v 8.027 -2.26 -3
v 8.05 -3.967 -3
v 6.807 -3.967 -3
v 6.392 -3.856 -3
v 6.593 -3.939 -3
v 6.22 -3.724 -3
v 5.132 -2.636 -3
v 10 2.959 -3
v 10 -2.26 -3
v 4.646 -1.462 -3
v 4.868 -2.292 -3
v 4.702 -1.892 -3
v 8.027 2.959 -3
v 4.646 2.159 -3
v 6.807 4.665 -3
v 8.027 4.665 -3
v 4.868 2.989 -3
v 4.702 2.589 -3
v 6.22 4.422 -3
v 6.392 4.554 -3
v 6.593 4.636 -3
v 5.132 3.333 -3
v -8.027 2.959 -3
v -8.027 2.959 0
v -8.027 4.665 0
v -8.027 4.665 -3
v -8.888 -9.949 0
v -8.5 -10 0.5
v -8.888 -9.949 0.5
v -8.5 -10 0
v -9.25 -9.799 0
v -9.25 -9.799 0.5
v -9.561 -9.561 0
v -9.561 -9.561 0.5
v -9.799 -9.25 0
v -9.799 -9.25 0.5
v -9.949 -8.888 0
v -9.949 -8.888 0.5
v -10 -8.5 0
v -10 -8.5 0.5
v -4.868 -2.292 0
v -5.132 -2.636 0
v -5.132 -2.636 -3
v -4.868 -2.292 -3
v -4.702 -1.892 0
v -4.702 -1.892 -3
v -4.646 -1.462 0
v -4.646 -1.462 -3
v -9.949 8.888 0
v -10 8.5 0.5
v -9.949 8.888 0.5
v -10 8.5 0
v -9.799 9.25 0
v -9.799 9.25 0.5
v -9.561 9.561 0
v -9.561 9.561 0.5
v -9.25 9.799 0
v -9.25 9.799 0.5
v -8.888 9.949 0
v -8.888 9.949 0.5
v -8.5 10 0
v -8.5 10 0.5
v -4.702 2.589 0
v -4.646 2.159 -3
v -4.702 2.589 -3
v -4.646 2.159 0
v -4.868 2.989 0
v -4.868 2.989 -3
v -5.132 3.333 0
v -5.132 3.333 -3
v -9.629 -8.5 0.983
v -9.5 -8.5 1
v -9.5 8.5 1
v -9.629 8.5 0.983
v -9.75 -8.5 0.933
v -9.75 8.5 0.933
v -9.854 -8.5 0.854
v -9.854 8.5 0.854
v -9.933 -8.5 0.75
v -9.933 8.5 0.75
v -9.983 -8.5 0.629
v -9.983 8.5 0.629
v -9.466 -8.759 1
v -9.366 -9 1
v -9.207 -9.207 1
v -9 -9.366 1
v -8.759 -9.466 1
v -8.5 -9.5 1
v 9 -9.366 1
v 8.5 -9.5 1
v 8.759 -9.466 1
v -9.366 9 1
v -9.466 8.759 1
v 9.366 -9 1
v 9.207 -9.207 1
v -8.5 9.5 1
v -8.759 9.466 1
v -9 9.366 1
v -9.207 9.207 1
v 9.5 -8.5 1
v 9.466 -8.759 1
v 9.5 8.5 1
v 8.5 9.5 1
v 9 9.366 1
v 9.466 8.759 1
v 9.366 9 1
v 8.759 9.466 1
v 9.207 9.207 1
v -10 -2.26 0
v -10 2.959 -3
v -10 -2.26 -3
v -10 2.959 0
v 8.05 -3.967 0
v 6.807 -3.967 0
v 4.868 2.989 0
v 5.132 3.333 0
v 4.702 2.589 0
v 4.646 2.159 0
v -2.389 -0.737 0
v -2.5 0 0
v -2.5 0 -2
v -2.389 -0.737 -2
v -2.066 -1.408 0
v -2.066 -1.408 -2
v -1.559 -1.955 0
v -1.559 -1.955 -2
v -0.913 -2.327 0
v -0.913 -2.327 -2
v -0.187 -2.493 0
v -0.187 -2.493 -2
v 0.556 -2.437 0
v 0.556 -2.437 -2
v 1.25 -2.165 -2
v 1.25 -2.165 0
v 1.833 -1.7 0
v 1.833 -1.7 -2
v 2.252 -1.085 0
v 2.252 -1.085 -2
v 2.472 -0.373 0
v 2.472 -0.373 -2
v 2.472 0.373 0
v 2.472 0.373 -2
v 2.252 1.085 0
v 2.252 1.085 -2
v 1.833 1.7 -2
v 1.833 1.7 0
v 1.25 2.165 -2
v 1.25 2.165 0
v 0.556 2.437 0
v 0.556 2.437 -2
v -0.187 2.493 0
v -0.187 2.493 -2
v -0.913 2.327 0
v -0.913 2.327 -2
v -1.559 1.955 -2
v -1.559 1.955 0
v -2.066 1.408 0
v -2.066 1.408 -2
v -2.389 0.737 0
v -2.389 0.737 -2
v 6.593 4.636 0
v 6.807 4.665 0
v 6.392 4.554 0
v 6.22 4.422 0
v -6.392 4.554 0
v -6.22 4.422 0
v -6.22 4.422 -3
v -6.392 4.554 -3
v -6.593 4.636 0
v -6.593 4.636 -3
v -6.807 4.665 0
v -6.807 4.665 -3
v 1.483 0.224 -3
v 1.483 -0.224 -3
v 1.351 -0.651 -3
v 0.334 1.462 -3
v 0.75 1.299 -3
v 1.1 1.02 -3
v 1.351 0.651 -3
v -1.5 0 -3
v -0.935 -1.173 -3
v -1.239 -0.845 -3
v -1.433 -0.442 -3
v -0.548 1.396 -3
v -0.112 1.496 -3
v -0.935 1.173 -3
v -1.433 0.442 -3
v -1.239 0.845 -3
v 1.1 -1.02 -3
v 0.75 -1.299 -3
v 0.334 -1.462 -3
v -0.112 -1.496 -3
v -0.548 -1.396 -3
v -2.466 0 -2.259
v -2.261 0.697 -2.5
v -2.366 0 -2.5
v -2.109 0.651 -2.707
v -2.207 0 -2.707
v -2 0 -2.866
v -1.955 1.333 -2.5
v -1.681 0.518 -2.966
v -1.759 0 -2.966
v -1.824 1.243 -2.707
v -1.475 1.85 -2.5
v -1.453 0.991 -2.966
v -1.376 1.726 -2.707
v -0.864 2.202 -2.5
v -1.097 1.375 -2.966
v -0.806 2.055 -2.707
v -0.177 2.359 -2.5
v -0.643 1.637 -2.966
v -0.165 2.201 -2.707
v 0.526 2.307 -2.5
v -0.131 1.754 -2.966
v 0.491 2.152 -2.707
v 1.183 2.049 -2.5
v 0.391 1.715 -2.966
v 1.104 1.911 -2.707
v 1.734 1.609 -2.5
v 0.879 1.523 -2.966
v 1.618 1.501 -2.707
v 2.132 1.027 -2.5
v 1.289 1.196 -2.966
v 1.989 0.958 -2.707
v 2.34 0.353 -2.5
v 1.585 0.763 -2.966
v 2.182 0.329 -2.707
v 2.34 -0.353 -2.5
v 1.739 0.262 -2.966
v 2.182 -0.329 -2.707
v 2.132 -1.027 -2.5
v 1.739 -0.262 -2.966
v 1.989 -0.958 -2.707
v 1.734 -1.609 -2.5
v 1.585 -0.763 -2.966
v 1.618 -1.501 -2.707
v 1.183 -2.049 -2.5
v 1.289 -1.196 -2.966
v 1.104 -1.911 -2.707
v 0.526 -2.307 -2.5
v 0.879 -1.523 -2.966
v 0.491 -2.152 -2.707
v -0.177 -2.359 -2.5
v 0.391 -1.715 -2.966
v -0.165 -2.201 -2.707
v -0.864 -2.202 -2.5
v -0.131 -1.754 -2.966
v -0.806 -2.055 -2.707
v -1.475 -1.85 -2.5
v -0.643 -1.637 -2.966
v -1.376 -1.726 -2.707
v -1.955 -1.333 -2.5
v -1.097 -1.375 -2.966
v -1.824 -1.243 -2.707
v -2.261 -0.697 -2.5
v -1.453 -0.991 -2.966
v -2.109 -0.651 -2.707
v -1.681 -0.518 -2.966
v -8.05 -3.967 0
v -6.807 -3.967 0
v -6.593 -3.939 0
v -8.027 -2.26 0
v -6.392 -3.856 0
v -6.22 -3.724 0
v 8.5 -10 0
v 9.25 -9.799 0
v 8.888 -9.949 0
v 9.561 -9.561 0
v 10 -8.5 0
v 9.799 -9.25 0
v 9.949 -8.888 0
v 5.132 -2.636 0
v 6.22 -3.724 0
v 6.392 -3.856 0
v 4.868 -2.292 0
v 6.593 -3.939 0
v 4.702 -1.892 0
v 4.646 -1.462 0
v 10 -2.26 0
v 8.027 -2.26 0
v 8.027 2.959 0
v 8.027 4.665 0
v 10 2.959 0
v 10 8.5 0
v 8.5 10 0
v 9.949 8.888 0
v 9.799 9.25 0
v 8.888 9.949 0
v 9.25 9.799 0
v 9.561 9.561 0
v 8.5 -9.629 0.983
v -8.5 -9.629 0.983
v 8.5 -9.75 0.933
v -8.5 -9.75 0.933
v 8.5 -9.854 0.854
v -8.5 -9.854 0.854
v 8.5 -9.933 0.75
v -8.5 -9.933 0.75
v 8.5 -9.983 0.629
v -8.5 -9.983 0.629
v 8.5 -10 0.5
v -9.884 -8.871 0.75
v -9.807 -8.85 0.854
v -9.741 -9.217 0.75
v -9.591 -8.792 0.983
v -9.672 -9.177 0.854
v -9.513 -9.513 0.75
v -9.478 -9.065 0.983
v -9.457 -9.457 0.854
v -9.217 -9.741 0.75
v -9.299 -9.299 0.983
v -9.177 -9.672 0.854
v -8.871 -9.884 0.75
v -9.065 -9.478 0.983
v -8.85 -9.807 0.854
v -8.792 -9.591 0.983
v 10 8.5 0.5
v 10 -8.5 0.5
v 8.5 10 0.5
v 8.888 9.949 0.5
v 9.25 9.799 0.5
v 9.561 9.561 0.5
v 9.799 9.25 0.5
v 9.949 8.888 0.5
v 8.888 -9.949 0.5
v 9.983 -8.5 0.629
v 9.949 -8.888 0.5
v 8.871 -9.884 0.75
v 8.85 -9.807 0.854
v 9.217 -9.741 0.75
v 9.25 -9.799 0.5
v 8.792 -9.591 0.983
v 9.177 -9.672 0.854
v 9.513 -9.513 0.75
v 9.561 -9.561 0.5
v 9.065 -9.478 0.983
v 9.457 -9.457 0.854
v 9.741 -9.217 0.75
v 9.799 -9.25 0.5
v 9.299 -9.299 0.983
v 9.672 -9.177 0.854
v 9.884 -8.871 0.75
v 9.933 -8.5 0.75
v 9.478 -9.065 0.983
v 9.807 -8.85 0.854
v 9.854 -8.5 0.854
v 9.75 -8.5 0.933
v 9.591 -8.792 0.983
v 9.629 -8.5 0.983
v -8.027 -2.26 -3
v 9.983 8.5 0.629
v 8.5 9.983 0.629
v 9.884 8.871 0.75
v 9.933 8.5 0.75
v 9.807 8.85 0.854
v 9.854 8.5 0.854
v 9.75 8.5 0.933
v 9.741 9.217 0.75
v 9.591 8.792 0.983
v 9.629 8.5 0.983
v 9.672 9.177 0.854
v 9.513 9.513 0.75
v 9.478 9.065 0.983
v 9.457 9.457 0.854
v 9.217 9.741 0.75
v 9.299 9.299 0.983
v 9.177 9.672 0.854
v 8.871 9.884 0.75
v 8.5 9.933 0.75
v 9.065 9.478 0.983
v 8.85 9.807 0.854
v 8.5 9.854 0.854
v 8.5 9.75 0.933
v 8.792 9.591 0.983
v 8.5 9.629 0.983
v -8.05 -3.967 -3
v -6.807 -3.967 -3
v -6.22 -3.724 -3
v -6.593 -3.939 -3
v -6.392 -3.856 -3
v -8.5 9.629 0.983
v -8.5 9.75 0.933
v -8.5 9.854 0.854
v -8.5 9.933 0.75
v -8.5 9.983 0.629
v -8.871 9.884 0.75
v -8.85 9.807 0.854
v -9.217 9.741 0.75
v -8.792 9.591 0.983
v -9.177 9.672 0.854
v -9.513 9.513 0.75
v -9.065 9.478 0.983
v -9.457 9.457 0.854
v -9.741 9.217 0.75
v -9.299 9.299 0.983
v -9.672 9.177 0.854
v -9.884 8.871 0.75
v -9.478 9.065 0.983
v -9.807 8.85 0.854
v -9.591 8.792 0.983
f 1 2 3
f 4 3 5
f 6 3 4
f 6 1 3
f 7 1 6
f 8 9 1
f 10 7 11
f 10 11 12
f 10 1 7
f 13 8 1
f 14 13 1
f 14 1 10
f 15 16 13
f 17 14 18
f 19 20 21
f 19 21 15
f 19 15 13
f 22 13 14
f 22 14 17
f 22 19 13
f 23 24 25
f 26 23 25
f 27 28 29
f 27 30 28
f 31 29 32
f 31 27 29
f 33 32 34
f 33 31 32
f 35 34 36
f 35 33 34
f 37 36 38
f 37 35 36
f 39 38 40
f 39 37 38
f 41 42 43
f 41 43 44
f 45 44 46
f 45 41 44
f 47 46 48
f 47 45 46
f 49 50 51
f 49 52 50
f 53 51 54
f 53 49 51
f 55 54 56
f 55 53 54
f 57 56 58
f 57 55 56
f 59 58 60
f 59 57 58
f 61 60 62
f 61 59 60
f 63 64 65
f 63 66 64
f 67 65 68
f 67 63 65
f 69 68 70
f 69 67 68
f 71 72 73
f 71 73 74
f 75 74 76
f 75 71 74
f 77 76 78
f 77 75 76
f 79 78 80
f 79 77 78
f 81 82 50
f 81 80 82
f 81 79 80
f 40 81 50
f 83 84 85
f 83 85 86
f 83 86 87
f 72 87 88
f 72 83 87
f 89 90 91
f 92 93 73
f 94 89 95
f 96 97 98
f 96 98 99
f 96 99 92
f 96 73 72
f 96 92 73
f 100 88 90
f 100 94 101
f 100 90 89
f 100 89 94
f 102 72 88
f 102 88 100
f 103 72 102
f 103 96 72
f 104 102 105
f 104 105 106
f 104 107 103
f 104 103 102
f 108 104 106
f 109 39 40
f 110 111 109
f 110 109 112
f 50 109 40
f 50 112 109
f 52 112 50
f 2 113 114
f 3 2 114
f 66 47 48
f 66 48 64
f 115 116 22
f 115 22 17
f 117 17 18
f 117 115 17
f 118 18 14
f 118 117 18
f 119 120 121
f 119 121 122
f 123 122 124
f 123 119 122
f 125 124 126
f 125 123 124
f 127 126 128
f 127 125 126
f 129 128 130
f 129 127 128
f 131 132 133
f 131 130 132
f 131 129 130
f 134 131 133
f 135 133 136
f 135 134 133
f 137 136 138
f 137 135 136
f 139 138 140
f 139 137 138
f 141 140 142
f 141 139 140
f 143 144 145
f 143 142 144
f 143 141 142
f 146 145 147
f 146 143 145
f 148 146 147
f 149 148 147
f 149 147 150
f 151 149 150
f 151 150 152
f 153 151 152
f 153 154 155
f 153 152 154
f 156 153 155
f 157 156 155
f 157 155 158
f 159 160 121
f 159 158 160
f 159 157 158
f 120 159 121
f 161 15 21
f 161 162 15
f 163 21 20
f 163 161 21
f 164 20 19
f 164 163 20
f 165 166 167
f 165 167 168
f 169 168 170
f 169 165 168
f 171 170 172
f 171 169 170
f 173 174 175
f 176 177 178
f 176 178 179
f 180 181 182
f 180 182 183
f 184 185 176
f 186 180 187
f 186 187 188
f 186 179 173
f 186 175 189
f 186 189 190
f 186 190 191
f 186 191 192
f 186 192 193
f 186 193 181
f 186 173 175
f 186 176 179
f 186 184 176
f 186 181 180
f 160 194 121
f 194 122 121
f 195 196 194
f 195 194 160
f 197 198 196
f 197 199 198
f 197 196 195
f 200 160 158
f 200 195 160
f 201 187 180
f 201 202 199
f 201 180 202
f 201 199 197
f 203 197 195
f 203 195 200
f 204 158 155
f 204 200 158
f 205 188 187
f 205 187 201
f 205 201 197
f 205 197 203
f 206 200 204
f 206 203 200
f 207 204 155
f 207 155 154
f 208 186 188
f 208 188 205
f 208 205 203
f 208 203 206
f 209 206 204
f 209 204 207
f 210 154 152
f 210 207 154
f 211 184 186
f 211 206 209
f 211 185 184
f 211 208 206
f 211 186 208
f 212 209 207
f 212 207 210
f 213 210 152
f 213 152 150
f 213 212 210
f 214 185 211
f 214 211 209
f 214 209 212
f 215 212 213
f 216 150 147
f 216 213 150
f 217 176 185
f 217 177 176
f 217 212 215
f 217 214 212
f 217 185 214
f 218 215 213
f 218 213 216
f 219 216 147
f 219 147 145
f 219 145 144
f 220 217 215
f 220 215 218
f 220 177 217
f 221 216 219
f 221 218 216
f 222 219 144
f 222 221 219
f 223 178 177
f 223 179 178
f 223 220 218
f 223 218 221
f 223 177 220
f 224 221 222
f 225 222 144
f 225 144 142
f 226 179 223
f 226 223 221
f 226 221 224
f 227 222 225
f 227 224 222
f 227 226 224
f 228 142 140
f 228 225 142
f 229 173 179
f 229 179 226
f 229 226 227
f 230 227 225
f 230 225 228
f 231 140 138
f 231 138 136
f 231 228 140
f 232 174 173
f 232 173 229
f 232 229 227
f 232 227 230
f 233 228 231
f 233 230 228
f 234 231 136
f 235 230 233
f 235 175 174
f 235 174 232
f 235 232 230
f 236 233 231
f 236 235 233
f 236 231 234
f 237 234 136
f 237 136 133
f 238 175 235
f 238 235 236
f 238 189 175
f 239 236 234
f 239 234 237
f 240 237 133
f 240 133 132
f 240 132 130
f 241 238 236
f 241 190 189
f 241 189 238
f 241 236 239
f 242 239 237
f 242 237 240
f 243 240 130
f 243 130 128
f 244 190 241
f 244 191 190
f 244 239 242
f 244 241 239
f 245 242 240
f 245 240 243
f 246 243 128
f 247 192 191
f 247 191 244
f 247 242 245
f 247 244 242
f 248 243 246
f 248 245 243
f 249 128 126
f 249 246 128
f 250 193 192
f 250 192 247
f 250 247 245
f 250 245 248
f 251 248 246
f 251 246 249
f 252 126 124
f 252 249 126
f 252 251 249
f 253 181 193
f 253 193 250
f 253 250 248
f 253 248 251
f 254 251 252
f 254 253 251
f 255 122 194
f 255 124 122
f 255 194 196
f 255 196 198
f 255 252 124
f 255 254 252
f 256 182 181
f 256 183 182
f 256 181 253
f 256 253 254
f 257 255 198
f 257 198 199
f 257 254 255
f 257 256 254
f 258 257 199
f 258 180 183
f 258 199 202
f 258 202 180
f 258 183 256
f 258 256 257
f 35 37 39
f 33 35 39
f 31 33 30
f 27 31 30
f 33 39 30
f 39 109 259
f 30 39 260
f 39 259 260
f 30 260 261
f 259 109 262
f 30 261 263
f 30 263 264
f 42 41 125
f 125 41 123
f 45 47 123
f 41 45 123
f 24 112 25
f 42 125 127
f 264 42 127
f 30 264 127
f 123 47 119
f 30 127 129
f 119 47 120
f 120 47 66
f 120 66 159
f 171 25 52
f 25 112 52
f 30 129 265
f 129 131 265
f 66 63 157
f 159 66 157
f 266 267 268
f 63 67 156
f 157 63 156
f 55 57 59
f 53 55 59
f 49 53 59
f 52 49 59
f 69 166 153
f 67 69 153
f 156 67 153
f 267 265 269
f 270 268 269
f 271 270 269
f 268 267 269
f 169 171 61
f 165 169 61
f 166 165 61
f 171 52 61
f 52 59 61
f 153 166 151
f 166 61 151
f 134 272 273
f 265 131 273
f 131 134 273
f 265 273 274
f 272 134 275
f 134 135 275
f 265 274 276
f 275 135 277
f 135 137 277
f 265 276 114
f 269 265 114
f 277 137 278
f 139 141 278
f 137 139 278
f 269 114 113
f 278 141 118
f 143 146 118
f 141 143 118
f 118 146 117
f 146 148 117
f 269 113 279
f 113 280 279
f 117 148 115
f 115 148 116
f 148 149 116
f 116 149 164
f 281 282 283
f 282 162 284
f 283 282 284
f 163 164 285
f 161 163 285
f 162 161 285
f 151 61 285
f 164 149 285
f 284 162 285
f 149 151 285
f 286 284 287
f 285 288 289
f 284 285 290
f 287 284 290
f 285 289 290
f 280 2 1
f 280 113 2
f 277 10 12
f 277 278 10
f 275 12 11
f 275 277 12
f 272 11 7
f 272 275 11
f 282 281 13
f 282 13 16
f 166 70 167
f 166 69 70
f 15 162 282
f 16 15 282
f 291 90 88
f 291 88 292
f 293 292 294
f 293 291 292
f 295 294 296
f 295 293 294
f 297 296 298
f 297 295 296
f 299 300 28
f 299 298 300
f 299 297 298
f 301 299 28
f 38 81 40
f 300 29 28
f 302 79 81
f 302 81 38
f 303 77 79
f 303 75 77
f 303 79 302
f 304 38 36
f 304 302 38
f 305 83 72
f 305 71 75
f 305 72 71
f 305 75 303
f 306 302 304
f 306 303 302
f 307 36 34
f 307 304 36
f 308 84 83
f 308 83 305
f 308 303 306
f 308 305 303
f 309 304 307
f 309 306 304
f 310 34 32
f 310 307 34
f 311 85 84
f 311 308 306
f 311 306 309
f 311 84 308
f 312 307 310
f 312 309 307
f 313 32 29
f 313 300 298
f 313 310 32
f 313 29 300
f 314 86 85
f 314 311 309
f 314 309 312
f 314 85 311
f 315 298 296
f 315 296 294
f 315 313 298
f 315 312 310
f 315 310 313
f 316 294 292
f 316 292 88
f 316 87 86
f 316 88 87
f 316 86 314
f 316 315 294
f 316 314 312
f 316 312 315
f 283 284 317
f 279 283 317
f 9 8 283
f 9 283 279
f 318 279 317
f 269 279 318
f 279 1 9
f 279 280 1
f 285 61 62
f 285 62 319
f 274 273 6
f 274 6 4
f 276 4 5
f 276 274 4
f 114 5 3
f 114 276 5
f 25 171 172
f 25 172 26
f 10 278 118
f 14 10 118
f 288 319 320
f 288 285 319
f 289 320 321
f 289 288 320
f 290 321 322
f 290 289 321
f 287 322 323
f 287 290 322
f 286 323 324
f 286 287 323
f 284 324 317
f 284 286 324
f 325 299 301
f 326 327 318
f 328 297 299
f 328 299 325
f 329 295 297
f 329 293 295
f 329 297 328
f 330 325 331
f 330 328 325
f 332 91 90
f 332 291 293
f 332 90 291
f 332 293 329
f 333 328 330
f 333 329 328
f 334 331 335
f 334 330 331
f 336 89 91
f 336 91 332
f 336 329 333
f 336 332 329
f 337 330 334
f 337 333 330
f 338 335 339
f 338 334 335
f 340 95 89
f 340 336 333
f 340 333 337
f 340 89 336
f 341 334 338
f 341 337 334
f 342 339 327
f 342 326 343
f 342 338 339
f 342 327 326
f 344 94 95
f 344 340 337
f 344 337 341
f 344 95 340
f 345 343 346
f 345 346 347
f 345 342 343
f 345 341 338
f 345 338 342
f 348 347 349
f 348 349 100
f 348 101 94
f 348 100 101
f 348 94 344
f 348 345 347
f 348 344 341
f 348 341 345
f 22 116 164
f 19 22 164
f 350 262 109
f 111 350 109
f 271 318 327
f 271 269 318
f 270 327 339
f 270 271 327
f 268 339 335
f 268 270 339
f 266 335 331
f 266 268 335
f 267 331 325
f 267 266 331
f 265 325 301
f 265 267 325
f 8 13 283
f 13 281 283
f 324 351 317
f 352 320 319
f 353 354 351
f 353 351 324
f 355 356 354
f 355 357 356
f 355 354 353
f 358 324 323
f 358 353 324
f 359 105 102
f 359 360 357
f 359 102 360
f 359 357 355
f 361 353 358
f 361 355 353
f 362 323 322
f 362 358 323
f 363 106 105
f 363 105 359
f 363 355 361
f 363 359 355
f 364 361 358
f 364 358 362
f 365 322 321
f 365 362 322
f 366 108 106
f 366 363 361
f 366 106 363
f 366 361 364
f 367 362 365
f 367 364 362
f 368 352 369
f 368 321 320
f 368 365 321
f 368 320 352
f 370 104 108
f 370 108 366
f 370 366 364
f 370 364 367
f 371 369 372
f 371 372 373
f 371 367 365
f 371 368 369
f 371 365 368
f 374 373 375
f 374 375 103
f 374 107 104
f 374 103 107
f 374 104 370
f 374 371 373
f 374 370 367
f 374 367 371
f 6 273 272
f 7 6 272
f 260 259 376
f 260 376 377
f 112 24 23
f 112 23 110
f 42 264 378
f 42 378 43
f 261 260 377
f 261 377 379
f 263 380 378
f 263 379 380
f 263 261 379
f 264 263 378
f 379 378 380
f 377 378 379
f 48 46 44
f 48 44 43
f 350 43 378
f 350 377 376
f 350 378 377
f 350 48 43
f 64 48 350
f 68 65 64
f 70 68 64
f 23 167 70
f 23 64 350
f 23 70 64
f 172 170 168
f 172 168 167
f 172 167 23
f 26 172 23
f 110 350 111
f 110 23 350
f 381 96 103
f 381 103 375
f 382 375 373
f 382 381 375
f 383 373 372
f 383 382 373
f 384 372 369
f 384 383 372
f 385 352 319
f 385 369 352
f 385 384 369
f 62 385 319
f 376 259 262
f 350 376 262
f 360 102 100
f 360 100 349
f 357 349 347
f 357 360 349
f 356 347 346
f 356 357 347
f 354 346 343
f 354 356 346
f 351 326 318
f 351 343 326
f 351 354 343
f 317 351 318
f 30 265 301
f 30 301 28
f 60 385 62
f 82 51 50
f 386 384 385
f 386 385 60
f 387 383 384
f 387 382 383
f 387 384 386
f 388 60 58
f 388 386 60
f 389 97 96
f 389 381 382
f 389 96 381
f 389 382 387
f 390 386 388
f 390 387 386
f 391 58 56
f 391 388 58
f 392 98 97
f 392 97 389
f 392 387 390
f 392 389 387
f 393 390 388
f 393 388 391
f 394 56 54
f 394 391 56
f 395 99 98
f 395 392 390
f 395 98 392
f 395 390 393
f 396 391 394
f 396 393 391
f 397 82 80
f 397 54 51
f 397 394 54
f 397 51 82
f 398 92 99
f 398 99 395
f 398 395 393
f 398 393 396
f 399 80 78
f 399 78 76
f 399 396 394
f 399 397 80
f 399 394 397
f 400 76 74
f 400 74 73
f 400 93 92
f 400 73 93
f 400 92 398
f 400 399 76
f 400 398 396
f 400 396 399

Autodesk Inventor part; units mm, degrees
ref_plane "YZ Plane" through (0, 0, 0) normal (1, 0, 0) x (0, 1, 0)
ref_plane "XZ Plane" through (0, 0, 0) normal (0, 1, 0) x (-1, 0, 0)
ref_plane "XY Plane" through (0, 0, 0) normal (0, 0, 1) x (1, 0, 0)
sketch "Эскиз1" plane through (0, 0, 0) normal (0, 0, 1) x (1, 0, 0)
  circle A0 centre (0, 0) radius 2.5
  circle A1 centre (7.6, 7.6) radius 1.5
  circle A2 centre (-7.6, 7.6) radius 1.5
  circle A3 centre (-7.6, -7.6) radius 1.5
  circle A4 centre (7.6, -7.6) radius 1.5
  arc A5 (-8.5, 10) -> (-10, 8.5) centre (-8.5, 8.5) ccw
  line L0 (-8.5, 10) -> (8.5, 10)
  line L1 (-10, -8.5) -> (-10, 8.5)
  line L2 (-10, -8.5) -> (-10, -3.95)
  arc A6 (-10, -8.5) -> (-8.5, -10) centre (-8.5, -8.5) ccw
  line L3 (-3.95, -10) -> (-8.5, -10)
  line L4 (8.5, -10) -> (-8.5, -10)
  arc A7 (8.5, -10) -> (10, -8.5) centre (8.5, -8.5) ccw
  line L5 (10, -3.95) -> (10, -8.5)
  line L6 (10, 8.5) -> (10, -8.5)
  arc A8 (10, 8.5) -> (8.5, 10) centre (8.5, 8.5) ccw
  line L7 (3.95, 10) -> (8.5, 10)
extrude "Выдавливание1" add sketch "Эскиз1" along normal blind 1 contours A0 | A1 | A2 | A3 | A4 | L0 A8 L6 L5 A7 L4 L3 A6 L1 A5
fillet "Сопряжение1" radius 0.5 8 edges at (-9.5607, -9.5607, 1) (0, -10, 1) (9.5607, -9.5607, 1) (10, -6.225, 1) (9.5607, 9.5607, 1) (6.225, 10, 1) (-9.5607, 9.5607, 1) (-10, -6.225, 1)
sketch "Эскиз2" plane through (0, 0, 0) normal (0, 0, -1) x (-1, 0, 0)
  circle A0 centre (0, 0) radius 2.5
extrude "Выдавливание2" add sketch "Эскиз2" along normal blind 3
fillet "Сопряжение2" radius 1 1 edges at (2.5, 0, -3)
sketch "Эскиз3" plane through (0, 0, 0) normal (0, 0, -1) x (-1, 0, 0)
  line L0 (-10, -8.5) -> (-10, 8.5) projected
  line L1 (0, 0) -> (0, -8.5)
  arc A0 (6.2205, -3.7242) -> (6.8074, -3.9673) centre (6.8074, -3.1373) ccw
  line L2 (8.0499, -3.9673) -> (6.8074, -3.9673)
  line L3 (8.0267, -3.2811) -> (8.0407, -3.2952)
  line L4 (4.6459, 0.629) -> (4.6459, 2.1594)
  arc A1 (5.1321, 3.3332) -> (4.6459, 2.1594) centre (6.3059, 2.1594) ccw
  line L5 (6.8074, 4.6647) -> (8.0267, 4.6647)
  line L6 (6.2205, -3.7242) -> (5.1321, -2.6359)
  arc A2 (4.6459, -1.4621) -> (5.1321, -2.6359) centre (6.3059, -1.4621) ccw
  arc A3 (6.8074, 4.6647) -> (6.2205, 4.4216) centre (6.8074, 3.8347) ccw
  line L7 (5.1321, 3.3332) -> (6.2205, 4.4216)
  arc A4 (4.6459, 0.0684) -> (4.6431, 0.1025) centre (4.4384, 0.0684) ccw
  line L8 (4.6459, -1.4621) -> (4.6459, 0.629)
  arc A5 (4.6431, 0.5948) -> (4.6459, 0.629) centre (4.4384, 0.629) ccw
  line L9 (8.0499, -3.9673) -> (8.0267, -2.2602)
  line L10 (7.9913, 0.3493) -> (4.6459, 0.3493)
  line L11 (9.9996, 5.5485) -> (10, 5.5489)
  line L12 (8.0267, 2.9588) -> (8.0267, 4.6647)
  line L13 (8.0267, 2.9588) -> (10, 2.9588)
  line L14 (10, 8.5) -> (10, -8.5) projected
  line L15 (8.0267, -2.2602) -> (10, -2.2602)
  arc A6 (-6.8074, -3.9673) -> (-6.2205, -3.7242) centre (-6.8074, -3.1373) ccw
  line L16 (-8.0499, -3.9673) -> (-6.8074, -3.9673)
  line L17 (-8.0267, -3.2811) -> (-8.0407, -3.2952)
  line L18 (-6.2205, -3.7242) -> (-5.1321, -2.6359)
  arc A7 (-5.1321, -2.6359) -> (-4.6459, -1.4621) centre (-6.3059, -1.4621) ccw
  line L19 (-8.0499, -3.9673) -> (-8.0267, -2.2602)
  arc A8 (-4.6431, 0.1025) -> (-4.6459, 0.0684) centre (-4.4384, 0.0684) ccw
  line L20 (-4.6459, 0.629) -> (-4.6459, 2.1594)
  arc A9 (-4.6459, 2.1594) -> (-5.1321, 3.3332) centre (-6.3059, 2.1594) ccw
  line L21 (-6.8074, 4.6647) -> (-8.0267, 4.6647)
  line L22 (-7.9913, 0.3493) -> (-4.6459, 0.3493)
  arc A10 (-4.6459, 0.629) -> (-4.6431, 0.5948) centre (-4.4384, 0.629) ccw
  line L23 (-4.6459, -1.4621) -> (-4.6459, 0.629)
  line L24 (-9.9996, 5.5485) -> (-10, 5.5489)
  line L25 (-8.0267, 2.9588) -> (-8.0267, 4.6647)
  line L26 (-5.1321, 3.3332) -> (-6.2205, 4.4216)
  arc A11 (-6.2205, 4.4216) -> (-6.8074, 4.6647) centre (-6.8074, 3.8347) ccw
  line L27 (-8.0267, 2.9588) -> (-10, 2.9588)
  line L28 (-8.0267, -2.2602) -> (-10, -2.2602)
  point P0 (10, -4.8504)
  point P1 (-10, -4.8504)
extrude "Выдавливание3" add sketch "Эскиз3" along normal blind 3
properties part number "затычка"
